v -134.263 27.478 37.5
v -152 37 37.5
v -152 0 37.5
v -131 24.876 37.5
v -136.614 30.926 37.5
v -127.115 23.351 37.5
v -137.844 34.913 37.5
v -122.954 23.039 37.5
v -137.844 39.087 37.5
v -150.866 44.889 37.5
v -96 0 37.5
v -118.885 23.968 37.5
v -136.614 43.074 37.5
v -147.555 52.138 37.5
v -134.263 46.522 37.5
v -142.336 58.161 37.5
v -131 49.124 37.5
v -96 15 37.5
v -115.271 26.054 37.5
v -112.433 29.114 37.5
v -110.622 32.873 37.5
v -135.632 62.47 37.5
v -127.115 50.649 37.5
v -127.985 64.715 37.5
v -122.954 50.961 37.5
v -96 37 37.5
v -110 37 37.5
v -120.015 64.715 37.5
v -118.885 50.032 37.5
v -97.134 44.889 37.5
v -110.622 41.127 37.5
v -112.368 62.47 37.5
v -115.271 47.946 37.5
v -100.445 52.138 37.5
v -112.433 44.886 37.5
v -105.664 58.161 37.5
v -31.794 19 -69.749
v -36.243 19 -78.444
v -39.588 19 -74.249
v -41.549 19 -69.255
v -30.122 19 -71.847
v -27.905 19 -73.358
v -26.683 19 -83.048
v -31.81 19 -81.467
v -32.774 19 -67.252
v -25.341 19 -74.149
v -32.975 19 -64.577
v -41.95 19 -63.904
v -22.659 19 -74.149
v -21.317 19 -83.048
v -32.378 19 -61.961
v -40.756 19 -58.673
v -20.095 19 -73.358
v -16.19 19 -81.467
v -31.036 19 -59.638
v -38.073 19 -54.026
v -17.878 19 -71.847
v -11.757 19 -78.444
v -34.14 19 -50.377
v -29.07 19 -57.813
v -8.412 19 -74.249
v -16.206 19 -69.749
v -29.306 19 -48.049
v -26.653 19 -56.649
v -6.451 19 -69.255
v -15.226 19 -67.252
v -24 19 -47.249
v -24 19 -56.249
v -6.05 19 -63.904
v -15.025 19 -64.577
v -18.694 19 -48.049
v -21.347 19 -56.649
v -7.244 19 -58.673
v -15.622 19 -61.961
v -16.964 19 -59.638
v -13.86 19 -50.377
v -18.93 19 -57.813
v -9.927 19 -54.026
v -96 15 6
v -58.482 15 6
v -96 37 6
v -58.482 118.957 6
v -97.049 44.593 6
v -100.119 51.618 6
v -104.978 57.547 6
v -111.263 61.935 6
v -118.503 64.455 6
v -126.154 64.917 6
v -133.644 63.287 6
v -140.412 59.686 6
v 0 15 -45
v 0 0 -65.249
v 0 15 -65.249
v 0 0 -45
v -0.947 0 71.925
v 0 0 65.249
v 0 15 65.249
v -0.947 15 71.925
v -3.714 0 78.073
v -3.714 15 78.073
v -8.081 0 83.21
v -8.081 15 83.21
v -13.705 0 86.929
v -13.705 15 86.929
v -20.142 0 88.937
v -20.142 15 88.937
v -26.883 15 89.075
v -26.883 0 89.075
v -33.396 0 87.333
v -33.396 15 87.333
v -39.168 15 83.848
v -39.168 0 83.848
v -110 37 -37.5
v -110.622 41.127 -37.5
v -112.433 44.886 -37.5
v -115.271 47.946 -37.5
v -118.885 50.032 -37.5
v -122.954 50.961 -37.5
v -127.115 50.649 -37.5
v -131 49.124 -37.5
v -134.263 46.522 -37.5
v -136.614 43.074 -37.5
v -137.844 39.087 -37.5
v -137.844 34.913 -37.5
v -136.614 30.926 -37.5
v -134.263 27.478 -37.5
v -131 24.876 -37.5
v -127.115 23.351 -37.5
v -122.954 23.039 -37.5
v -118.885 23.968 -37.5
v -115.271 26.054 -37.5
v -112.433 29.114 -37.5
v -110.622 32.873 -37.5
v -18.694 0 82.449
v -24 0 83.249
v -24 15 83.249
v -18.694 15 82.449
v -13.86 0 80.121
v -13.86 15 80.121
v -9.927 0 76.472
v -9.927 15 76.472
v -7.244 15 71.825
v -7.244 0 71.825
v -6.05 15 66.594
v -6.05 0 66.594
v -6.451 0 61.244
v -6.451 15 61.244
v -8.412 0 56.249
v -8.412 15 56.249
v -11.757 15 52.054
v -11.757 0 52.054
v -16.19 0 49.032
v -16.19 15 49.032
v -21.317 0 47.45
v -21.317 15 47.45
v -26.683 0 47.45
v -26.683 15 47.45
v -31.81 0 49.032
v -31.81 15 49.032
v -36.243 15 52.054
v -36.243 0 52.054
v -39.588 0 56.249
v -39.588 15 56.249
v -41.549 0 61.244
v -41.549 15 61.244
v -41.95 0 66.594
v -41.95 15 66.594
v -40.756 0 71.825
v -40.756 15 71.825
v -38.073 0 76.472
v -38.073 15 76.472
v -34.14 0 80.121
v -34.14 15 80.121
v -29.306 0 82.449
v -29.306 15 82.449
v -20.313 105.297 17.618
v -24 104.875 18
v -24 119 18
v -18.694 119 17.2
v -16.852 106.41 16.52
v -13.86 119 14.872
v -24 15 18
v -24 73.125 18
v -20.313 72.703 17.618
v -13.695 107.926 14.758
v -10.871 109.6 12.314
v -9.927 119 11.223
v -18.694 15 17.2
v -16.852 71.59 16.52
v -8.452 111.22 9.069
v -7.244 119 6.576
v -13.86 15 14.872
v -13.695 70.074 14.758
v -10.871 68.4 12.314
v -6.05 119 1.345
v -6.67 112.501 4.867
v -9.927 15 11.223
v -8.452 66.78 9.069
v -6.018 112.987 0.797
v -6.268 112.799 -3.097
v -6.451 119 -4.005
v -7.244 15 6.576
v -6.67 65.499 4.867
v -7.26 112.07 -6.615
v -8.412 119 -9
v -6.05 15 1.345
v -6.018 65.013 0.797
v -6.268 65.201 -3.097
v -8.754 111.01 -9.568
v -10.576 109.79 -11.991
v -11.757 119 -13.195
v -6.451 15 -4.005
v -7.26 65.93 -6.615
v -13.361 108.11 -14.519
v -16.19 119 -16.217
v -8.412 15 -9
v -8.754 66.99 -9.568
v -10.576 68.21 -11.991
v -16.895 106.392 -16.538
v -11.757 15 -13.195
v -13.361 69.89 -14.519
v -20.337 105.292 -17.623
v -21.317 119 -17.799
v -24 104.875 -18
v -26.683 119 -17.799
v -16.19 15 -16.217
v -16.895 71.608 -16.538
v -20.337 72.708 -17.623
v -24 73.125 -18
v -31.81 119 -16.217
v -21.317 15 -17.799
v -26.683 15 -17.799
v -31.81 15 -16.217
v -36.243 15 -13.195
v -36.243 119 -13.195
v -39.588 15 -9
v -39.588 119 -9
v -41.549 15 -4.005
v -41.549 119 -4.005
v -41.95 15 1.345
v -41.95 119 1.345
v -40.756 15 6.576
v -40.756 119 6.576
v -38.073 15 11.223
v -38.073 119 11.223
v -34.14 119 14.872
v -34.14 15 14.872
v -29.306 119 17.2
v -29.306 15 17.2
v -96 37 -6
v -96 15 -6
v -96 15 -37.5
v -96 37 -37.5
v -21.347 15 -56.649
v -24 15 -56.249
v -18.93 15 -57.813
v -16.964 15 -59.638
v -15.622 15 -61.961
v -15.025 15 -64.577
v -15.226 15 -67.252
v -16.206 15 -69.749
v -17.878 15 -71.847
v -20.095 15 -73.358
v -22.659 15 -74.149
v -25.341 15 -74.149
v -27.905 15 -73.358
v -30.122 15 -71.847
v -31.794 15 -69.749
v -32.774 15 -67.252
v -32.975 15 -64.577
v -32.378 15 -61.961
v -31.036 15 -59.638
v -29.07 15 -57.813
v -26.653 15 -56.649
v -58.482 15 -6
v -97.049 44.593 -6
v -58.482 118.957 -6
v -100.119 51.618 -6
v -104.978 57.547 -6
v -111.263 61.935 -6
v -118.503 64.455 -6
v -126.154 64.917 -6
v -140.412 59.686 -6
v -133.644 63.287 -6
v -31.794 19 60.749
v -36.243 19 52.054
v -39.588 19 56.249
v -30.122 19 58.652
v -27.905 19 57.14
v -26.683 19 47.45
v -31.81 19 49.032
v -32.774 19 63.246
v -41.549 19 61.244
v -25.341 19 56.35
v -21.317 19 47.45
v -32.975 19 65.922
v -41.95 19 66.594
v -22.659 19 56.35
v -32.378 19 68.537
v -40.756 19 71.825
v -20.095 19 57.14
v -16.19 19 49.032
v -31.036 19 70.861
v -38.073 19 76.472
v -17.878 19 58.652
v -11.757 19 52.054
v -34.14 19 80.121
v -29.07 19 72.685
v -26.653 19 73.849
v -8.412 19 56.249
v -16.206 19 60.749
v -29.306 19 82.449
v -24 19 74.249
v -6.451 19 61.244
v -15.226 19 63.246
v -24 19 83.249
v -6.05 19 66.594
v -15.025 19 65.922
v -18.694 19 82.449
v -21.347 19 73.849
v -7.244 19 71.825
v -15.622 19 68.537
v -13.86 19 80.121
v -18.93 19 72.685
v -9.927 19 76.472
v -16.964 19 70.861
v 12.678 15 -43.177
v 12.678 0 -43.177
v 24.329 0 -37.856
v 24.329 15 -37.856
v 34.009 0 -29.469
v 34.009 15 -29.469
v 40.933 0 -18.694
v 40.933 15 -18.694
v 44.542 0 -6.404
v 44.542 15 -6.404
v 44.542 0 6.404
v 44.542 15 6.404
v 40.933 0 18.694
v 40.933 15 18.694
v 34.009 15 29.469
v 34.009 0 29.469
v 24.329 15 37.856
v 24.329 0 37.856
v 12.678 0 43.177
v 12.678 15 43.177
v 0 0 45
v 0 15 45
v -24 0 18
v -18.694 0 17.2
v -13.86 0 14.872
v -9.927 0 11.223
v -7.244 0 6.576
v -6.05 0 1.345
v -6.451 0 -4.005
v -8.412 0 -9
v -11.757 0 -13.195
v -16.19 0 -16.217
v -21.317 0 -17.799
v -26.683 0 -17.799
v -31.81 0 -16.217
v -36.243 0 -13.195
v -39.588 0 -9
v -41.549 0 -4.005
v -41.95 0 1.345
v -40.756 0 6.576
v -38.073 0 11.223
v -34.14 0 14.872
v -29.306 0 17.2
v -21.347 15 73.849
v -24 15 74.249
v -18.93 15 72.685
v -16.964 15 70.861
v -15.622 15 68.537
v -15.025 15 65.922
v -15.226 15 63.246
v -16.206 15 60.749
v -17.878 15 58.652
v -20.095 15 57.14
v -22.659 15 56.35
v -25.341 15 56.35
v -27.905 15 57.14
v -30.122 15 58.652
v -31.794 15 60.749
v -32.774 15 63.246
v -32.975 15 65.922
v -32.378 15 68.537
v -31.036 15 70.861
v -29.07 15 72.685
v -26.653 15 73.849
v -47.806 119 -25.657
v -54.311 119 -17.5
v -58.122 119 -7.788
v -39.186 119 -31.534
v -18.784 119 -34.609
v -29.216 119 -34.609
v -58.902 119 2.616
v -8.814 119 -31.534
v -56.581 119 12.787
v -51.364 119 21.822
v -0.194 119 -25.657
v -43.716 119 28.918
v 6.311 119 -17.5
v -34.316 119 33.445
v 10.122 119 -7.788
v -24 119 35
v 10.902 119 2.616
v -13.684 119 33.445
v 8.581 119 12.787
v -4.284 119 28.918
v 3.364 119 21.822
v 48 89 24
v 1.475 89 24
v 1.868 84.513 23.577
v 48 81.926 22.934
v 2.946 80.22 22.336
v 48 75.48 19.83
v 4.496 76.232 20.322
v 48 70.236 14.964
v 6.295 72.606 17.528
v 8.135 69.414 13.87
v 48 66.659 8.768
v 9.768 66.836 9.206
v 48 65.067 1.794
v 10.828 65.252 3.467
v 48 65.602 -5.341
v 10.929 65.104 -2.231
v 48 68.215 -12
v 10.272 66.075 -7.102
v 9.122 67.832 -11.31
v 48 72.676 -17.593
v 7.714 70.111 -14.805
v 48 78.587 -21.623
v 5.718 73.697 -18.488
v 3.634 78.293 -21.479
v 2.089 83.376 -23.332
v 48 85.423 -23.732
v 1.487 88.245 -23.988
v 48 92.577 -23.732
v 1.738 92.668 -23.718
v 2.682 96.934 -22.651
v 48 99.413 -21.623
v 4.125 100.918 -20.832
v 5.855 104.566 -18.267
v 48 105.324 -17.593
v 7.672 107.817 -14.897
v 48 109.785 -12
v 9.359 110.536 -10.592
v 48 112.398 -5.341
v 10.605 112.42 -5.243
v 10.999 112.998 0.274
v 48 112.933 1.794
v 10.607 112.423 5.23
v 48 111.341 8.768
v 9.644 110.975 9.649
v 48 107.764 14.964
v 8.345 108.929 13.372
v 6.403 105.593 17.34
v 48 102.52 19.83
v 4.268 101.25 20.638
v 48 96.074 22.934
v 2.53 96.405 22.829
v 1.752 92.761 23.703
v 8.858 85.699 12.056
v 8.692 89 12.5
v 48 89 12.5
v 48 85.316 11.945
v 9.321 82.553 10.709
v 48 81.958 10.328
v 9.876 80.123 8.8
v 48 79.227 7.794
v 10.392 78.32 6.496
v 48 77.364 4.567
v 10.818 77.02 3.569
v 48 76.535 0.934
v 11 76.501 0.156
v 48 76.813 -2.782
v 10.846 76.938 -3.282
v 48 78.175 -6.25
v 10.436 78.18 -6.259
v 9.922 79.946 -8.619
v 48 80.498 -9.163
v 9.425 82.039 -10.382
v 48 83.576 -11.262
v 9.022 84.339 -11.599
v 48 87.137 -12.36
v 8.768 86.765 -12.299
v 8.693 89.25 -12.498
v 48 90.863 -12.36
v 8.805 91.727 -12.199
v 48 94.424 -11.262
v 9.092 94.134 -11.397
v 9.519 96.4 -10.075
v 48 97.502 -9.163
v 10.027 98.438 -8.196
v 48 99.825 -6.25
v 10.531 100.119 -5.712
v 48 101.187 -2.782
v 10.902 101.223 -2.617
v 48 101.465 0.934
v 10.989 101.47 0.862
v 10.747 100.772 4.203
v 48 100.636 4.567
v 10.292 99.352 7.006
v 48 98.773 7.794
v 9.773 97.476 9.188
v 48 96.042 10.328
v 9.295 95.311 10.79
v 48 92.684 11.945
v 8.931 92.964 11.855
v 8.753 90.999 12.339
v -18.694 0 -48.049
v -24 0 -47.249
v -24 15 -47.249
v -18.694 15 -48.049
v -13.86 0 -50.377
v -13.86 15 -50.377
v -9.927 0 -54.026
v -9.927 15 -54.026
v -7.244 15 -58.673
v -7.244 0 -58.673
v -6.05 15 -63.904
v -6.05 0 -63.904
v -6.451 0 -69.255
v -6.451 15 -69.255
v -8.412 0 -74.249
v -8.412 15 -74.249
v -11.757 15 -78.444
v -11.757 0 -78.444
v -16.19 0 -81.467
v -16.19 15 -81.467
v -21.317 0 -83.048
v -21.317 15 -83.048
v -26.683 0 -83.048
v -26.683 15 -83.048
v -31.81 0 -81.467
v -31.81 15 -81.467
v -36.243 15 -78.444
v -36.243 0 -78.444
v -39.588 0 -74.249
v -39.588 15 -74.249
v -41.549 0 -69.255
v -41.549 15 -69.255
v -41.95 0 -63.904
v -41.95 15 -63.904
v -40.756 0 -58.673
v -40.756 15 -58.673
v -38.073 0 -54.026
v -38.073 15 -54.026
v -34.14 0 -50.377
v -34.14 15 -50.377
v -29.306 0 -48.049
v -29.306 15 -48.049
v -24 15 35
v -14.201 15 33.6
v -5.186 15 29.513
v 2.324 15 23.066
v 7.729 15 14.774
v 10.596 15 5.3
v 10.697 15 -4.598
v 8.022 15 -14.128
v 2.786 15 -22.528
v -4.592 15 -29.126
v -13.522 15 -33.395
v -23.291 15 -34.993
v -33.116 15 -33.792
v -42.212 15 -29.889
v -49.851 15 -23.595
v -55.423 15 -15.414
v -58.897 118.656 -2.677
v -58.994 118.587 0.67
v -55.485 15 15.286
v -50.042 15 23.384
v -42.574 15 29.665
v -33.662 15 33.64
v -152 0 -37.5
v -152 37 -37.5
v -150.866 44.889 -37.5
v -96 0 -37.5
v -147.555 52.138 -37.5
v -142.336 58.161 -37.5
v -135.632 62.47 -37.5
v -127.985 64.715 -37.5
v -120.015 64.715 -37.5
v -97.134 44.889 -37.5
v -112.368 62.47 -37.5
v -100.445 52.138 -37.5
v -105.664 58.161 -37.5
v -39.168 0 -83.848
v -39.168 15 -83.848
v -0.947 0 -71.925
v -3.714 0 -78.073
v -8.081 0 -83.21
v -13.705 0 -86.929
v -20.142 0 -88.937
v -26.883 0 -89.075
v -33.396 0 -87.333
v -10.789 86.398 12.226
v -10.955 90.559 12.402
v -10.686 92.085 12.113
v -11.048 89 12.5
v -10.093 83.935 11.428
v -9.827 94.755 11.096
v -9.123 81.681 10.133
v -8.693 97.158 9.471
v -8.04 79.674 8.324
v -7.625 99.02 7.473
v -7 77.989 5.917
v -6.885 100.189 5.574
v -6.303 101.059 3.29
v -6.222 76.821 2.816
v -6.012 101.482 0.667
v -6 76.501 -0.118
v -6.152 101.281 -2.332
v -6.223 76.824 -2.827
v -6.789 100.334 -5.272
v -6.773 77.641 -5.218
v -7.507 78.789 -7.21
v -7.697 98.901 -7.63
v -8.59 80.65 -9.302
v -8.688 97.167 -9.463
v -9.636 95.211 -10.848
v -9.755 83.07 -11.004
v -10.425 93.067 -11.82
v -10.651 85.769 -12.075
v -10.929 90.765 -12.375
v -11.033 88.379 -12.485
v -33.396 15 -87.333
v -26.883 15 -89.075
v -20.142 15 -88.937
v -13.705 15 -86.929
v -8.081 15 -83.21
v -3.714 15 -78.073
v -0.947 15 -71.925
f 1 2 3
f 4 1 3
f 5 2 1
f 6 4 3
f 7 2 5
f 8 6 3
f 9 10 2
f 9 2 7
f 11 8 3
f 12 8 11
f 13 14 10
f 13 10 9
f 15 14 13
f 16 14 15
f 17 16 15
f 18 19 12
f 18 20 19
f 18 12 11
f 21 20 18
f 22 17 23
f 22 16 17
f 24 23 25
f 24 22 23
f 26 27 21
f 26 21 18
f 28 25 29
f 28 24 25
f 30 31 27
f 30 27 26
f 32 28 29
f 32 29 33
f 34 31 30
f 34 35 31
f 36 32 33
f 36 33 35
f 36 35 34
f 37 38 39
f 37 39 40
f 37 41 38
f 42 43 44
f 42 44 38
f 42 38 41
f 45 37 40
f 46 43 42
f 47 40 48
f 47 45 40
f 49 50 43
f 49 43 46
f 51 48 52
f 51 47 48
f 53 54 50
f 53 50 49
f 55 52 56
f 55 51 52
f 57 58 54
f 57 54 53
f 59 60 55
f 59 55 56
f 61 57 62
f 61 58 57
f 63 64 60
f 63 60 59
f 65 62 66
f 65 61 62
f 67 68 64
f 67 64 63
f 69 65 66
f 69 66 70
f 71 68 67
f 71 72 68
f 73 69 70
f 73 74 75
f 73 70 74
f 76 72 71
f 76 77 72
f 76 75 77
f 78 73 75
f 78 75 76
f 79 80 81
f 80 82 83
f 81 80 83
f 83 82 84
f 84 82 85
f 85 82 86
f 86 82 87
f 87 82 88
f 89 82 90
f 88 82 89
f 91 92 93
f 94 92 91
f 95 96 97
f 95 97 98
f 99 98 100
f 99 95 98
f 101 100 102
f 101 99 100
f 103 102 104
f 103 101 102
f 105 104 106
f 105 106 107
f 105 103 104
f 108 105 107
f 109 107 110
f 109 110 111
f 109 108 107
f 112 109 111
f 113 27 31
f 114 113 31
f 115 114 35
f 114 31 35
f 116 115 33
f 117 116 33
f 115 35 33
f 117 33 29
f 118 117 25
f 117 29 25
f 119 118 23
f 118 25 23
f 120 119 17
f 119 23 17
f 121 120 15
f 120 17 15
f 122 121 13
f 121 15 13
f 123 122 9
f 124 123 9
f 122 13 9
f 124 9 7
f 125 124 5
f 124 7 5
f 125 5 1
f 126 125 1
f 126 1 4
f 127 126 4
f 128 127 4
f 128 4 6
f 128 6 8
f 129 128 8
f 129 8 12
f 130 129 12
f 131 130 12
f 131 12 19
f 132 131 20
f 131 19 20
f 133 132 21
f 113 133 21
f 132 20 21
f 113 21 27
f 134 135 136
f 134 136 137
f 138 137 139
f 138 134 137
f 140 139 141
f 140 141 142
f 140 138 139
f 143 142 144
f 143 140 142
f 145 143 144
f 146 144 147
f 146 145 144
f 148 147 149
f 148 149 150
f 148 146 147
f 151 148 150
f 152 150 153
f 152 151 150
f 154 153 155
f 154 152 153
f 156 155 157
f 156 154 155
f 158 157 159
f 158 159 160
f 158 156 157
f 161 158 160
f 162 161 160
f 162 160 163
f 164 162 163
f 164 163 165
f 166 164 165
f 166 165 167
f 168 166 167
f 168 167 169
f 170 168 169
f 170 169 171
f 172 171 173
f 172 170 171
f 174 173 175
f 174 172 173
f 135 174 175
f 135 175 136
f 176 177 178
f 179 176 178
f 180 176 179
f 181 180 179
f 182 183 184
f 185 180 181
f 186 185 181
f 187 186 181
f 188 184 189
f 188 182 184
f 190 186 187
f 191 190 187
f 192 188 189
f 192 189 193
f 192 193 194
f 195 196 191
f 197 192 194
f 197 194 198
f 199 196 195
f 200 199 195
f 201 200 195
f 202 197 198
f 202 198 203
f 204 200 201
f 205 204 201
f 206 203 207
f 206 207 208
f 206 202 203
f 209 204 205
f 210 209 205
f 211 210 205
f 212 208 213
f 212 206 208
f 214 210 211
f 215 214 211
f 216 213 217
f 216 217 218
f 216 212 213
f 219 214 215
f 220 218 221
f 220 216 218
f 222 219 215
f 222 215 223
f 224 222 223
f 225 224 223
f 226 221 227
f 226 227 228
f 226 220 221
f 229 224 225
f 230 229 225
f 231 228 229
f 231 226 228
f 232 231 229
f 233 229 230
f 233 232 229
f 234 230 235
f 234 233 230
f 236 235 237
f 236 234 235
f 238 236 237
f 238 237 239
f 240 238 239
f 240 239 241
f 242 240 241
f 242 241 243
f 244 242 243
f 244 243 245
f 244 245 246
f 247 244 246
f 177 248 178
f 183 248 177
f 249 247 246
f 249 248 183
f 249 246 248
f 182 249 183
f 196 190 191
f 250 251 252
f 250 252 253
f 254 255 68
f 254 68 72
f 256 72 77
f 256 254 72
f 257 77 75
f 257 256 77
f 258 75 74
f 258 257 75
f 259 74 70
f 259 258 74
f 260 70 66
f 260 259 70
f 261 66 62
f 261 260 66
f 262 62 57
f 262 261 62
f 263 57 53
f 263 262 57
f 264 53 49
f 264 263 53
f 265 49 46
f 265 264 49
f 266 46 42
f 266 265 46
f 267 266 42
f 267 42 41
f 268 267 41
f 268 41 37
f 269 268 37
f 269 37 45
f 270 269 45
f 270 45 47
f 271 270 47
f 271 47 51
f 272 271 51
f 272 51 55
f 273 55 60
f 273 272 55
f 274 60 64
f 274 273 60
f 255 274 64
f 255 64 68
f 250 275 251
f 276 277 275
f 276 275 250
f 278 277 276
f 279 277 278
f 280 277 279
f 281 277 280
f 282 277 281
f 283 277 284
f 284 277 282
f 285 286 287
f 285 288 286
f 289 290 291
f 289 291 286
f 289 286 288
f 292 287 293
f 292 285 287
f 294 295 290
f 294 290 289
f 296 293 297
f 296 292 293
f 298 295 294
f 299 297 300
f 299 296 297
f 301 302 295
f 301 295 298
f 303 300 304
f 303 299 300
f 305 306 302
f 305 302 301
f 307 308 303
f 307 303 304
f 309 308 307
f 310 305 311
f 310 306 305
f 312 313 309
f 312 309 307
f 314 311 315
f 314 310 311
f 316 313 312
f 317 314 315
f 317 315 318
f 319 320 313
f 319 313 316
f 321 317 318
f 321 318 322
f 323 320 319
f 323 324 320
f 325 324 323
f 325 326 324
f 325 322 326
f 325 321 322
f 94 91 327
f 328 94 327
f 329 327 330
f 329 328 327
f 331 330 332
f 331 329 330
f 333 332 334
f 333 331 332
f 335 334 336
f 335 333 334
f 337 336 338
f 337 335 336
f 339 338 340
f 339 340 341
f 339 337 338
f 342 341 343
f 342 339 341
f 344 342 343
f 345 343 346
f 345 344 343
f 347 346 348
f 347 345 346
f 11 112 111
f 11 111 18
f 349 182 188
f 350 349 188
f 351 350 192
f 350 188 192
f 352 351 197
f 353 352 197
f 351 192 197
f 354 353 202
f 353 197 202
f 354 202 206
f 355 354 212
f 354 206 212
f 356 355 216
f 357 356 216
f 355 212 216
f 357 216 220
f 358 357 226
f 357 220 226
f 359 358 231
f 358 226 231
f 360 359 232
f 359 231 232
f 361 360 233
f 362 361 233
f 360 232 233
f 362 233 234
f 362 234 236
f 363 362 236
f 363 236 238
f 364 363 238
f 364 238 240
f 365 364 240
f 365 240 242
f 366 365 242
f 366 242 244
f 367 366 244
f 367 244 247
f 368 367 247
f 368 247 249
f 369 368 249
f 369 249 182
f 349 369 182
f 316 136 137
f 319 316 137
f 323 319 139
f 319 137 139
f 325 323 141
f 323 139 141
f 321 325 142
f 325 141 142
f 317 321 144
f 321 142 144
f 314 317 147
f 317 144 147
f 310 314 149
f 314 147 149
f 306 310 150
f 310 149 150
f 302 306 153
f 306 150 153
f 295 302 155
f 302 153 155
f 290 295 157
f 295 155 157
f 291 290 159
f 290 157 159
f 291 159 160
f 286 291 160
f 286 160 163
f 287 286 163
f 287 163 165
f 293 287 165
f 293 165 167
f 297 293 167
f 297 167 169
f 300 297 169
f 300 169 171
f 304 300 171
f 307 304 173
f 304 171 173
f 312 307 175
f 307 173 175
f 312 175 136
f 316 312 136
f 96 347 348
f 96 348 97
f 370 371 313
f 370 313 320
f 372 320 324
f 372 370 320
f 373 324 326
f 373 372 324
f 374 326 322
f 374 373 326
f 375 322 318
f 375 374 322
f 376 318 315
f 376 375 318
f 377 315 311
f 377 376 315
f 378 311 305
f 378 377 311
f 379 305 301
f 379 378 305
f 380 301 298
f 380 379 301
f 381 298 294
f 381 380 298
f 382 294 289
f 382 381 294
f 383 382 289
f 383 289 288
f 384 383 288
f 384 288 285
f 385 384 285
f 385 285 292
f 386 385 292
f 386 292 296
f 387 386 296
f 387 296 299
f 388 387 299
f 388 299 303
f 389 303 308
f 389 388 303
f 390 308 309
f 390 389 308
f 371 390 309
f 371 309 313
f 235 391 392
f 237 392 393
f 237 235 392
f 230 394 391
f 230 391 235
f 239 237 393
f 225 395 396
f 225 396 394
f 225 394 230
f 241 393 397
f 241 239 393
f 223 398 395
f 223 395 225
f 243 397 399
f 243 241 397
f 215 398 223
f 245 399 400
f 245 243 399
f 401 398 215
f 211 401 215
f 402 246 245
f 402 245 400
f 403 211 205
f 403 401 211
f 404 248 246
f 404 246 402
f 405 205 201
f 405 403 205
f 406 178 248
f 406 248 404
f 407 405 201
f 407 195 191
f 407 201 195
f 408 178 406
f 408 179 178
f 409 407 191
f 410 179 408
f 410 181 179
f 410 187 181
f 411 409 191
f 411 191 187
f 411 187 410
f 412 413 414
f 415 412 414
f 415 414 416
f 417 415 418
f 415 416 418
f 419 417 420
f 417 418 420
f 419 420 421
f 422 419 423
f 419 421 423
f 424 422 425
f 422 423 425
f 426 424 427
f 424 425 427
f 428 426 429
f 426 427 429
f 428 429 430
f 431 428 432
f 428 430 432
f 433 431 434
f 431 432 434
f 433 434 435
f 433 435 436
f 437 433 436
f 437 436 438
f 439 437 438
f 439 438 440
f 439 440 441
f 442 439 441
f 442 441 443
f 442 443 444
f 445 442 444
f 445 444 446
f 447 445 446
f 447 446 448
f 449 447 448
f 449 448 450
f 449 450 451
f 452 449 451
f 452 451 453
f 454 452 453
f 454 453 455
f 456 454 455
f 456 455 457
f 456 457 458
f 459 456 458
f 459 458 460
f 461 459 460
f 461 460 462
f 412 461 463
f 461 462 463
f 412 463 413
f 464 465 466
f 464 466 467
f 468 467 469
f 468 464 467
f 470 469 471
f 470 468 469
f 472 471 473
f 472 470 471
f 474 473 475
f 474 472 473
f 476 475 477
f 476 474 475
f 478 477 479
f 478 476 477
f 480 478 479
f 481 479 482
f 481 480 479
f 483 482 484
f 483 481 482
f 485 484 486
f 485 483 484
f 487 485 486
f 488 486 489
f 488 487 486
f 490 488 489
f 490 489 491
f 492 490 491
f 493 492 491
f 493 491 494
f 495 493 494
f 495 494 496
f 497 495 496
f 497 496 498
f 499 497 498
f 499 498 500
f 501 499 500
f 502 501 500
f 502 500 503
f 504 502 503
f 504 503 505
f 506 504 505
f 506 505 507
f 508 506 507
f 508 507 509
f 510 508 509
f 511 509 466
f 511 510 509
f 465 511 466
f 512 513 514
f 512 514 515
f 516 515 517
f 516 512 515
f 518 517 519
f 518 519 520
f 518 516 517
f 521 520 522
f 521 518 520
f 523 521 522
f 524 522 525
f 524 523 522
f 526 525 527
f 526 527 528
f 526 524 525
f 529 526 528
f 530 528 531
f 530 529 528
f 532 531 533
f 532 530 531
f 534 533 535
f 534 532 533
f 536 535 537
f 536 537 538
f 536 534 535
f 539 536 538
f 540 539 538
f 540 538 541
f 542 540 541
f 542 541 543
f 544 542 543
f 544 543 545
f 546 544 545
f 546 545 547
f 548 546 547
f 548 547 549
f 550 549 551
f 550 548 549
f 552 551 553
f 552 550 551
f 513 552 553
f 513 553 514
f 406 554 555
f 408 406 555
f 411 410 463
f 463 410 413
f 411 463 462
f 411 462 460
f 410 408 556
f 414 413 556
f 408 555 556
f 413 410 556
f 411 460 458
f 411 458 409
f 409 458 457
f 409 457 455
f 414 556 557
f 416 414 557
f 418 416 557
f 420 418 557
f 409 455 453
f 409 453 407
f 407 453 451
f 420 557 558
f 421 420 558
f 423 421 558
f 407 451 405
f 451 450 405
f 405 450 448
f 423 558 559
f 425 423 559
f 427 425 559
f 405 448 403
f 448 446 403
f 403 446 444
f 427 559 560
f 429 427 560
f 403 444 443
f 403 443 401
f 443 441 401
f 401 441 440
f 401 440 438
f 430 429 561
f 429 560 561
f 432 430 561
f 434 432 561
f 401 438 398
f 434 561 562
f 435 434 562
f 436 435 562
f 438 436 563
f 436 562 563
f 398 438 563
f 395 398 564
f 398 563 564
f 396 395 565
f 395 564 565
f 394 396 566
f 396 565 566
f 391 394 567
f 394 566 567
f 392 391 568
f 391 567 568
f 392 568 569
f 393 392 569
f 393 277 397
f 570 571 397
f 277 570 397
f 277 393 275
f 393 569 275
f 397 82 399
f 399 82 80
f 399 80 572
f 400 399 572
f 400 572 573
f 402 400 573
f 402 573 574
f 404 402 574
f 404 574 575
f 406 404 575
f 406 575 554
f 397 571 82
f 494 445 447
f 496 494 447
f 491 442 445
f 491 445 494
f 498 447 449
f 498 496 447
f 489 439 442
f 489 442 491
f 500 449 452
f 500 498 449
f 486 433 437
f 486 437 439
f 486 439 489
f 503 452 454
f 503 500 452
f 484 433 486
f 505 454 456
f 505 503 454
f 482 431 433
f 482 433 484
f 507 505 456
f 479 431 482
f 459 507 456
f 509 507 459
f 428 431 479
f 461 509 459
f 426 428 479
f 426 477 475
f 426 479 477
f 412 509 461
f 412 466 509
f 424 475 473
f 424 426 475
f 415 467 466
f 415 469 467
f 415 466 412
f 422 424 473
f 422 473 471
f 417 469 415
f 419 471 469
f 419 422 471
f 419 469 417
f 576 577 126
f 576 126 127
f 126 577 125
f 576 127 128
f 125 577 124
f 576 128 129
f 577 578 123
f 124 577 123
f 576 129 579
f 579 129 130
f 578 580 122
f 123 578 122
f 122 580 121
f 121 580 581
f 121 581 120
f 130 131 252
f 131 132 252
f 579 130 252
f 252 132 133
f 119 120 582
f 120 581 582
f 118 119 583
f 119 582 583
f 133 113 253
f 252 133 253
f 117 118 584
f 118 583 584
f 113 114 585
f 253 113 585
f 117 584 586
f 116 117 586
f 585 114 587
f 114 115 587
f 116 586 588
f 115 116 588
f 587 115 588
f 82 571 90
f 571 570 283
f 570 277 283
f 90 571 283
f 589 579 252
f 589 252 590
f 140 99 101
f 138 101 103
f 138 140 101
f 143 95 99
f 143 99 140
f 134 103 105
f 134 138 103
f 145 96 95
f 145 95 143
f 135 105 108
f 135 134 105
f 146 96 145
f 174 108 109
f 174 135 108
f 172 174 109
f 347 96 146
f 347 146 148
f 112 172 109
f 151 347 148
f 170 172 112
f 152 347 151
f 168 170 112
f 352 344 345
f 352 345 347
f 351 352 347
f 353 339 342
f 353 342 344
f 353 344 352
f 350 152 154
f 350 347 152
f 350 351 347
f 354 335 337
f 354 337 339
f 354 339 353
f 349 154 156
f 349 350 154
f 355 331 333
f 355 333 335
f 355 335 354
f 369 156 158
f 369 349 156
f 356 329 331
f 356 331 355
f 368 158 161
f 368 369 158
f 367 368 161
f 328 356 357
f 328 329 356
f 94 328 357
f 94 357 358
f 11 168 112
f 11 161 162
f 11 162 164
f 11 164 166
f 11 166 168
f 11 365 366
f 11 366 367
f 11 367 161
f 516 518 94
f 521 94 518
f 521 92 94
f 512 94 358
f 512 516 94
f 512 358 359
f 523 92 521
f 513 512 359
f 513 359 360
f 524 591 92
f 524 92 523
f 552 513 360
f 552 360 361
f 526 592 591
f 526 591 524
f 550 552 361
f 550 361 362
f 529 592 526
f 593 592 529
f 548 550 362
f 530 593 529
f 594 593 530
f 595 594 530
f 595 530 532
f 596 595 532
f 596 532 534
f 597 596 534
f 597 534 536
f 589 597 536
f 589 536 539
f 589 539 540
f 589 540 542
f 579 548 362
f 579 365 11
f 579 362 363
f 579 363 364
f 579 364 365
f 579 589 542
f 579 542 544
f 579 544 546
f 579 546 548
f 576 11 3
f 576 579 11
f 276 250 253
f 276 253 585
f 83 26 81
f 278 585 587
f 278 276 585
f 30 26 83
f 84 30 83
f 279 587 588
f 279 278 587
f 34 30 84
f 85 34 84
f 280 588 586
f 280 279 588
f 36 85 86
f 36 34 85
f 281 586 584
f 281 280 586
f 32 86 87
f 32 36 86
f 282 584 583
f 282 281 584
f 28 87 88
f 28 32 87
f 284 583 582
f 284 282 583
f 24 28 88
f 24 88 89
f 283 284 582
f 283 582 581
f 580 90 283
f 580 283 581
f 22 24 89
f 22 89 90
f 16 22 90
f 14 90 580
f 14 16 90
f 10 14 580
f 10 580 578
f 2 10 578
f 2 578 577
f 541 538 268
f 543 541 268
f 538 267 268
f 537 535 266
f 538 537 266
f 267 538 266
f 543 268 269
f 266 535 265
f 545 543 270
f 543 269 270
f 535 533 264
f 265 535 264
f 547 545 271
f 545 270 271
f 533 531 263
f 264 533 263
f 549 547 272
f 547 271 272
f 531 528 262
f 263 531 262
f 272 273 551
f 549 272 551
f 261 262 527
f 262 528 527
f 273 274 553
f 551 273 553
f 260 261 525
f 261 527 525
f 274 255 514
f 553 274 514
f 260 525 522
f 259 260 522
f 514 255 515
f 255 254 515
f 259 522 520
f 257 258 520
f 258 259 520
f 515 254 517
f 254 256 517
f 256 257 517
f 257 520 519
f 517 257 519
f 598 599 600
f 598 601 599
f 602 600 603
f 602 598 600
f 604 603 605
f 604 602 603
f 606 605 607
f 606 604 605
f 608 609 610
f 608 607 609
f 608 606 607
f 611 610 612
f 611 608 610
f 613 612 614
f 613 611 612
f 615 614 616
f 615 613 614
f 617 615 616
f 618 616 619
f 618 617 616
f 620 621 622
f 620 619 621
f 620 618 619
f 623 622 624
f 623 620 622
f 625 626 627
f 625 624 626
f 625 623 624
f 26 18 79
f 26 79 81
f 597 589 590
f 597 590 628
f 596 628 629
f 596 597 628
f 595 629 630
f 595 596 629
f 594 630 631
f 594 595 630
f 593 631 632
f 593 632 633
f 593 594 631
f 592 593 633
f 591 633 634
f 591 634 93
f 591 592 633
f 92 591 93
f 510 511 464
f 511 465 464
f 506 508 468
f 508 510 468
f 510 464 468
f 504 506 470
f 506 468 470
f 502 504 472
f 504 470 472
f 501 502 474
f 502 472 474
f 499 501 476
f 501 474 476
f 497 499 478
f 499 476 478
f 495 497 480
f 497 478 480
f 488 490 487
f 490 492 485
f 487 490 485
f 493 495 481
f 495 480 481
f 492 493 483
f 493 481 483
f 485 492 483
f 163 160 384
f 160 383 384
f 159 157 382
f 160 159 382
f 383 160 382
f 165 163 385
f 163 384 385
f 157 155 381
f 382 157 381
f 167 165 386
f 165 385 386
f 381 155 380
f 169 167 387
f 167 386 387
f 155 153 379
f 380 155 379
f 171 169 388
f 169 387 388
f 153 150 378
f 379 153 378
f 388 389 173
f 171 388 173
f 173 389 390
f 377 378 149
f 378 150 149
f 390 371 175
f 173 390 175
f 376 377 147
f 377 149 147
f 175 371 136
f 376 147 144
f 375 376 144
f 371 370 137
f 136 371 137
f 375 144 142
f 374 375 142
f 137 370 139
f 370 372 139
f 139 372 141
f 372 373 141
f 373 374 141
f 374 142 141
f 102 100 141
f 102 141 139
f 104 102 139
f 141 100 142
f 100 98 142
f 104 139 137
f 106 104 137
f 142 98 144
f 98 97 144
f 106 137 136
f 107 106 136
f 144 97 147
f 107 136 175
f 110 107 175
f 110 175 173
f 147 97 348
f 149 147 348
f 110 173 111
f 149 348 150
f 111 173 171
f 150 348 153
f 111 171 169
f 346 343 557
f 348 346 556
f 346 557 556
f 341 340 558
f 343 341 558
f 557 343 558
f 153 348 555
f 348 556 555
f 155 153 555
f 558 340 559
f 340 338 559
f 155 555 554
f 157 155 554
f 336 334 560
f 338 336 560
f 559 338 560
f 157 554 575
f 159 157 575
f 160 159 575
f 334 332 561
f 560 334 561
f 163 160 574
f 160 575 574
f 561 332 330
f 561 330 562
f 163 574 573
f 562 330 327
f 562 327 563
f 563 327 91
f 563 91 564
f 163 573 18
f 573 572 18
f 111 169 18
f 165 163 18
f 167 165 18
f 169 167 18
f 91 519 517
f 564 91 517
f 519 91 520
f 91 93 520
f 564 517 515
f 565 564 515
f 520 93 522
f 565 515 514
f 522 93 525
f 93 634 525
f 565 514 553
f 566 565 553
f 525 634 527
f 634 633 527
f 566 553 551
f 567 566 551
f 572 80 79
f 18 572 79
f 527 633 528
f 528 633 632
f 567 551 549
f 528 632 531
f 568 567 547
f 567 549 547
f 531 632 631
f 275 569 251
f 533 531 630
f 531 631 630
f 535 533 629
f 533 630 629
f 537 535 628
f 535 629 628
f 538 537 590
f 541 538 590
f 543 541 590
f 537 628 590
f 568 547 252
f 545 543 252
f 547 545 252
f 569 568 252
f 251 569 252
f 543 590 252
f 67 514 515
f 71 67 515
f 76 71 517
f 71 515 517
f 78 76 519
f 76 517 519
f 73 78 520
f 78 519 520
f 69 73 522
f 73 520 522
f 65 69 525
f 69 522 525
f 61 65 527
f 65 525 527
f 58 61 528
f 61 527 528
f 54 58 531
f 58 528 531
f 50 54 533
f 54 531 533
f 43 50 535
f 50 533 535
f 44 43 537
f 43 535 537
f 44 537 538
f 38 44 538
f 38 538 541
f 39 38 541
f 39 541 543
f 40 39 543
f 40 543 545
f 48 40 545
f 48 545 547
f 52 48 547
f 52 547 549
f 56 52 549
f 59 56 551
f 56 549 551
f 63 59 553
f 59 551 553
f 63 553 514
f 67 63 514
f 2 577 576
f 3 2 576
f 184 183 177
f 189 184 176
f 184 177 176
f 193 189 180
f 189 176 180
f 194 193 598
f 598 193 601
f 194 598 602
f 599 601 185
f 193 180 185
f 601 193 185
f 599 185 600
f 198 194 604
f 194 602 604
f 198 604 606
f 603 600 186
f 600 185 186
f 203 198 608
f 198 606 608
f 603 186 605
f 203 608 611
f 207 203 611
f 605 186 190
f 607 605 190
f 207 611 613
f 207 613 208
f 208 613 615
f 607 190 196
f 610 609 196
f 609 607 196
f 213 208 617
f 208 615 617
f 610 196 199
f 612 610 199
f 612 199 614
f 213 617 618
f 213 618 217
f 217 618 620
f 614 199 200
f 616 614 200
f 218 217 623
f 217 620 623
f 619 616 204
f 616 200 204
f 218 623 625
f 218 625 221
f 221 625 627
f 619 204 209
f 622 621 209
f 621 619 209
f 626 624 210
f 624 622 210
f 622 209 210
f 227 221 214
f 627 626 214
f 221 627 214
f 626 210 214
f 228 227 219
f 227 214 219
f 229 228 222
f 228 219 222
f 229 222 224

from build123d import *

# Parameters (mm, degrees)
SKETCH1_R             = 18
BOSS_EXTRUDE1_DEPTH   = 15
SKETCH2_R             = 18
SKETCH2_R_2           = 9
BOSS_EXTRUDE2_DEPTH   = 4
BOSS_EXTRUDE2_2_DEPTH = 4
SKETCH3_R             = 35
SKETCH3_R_2           = 18
BOSS_EXTRUDE3_DEPTH   = 104
SKETCH4_R             = 14
BOSS_EXTRUDE4_DEPTH   = 75
SKETCH6_R             = 24
SKETCH6_R_2           = 12.5
BOSS_EXTRUDE5_DEPTH   = 72
SKETCH9_R             = 18
CUT_EXTRUDE2_DEPTH    = 213.674418186
RIB1_REACH            = 214.674
SKETCH17_WALL_W       = 526.407388692
SKETCH17_WALL_H       = 12


with BuildPart() as part:
    # Sketch1 → Boss-Extrude1 (new body)
    with BuildSketch(Plane(origin=(0, 0, 0), x_dir=(1, 0, 0), z_dir=(0, 1, 0))):
        with BuildLine():
            Line((0, -45), (0, -65.249135293))
            ThreePointArc((0, -65.249135293), (-13.705250772, -86.929037007), (-39.168178194, -83.848231247))
            Line((-39.168178194, -83.848231247), (-96, -37.5))
            Line((-96, -37.5), (-152, -37.5))
            Line((-152, -37.5), (-152, 37.5))
            Line((-152, 37.5), (-96, 37.5))
            Line((-96, 37.5), (-39.168178194, 83.848231247))
            ThreePointArc((-39.168178194, 83.848231247), (-13.705250772, 86.929037007), (0, 65.249135293))
            Line((0, 65.249135293), (0, 45))
            ThreePointArc((0, 45), (45, 0), (0, -45))
        make_face()
        with Locations(Location((-24, 65.249135293, 0), (0, 0, 270))):
            Circle(SKETCH1_R, mode=Mode.SUBTRACT)
        with Locations(Location((-24, -65.249135293, 0), (0, 0, 270))):
            Circle(SKETCH1_R, mode=Mode.SUBTRACT)
    extrude(amount=BOSS_EXTRUDE1_DEPTH)

    # Sketch3 → Boss-Extrude3 (add)
    with BuildSketch(Plane(origin=(0, 15, 0), x_dir=(1, 0, 0), z_dir=(0, 1, 0))):
        with Locations(Location((-24, 0, 0), (0, 0, 270))):
            Circle(SKETCH3_R)
        with Locations(Location((-24, 0, 0), (0, 0, 270))):
            Circle(SKETCH3_R_2, mode=Mode.SUBTRACT)
    extrude(amount=BOSS_EXTRUDE3_DEPTH)

    # Sketch4 → Boss-Extrude4 (add)
    with BuildSketch(Plane.XY.offset(37.5)):
        with BuildLine():
            Line((-96, 15), (-96, 37))
            ThreePointArc((-96, 37), (-124, 65), (-152, 37))
            Line((-152, 37), (-152, 15))
            Line((-152, 15), (-96, 15))
        make_face()
        with Locations((-124, 37)):
            Circle(SKETCH4_R, mode=Mode.SUBTRACT)
    extrude(amount=-BOSS_EXTRUDE4_DEPTH)

    # Sketch6 → Boss-Extrude5 (add)
    with BuildSketch(Plane(origin=(-24, 0, 0), x_dir=(0, 0, -1), z_dir=(1, 0, 0))):
        with Locations(Location((0, 89, 0), (0, 0, 180))):
            Circle(SKETCH6_R)
        with Locations(Location((0, 89, 0), (0, 0, 180))):
            Circle(SKETCH6_R_2, mode=Mode.SUBTRACT)
    extrude(amount=BOSS_EXTRUDE5_DEPTH)

    # Sketch9 → Cut-Extrude2 (cut, through all)
    with BuildSketch(Plane(origin=(0, 119, 0), x_dir=(1, 0, 0), z_dir=(0, 1, 0))):
        with Locations(Location((-24, 0, 0), (0, 0, 270))):
            Circle(SKETCH9_R)
    extrude(amount=-CUT_EXTRUDE2_DEPTH, mode=Mode.SUBTRACT)

    # Sketch17 wall → Rib1 (add, up to next)
    with BuildSketch(Plane(origin=(-99.129265772, 89.551140917, 0), x_dir=(-0.810213048284, -0.586135493202, 0), z_dir=(0.586135493202, -0.810213048284, 0)), mode=Mode.PRIVATE) as rib1_sk1:
        Rectangle(SKETCH17_WALL_W, SKETCH17_WALL_H)
    rib1_tool1 = extrude(rib1_sk1.sketch, amount=RIB1_REACH, mode=Mode.PRIVATE) - part.part
    add(rib1_tool1.solids().sort_by_distance((-99.129265772, 89.551140917, 0))[0])


with BuildPart() as body_2:
    # Sketch2 → Boss-Extrude2 (new body)
    with BuildSketch(Plane(origin=(0, 15, 0), x_dir=(1, 0, 0), z_dir=(0, 1, 0))):
        with Locations(Location((-24, 65.249135293, 0), (0, 0, 270))):
            Circle(SKETCH2_R)
        with Locations(Location((-24, 65.249135293, 0), (0, 0, 270))):
            Circle(SKETCH2_R_2, mode=Mode.SUBTRACT)
    extrude(amount=BOSS_EXTRUDE2_DEPTH)


with BuildPart() as body_3:
    # Sketch2 → Boss-Extrude2 2 (new body)
    with BuildSketch(Plane(origin=(0, 15, 0), x_dir=(1, 0, 0), z_dir=(0, 1, 0))):
        with Locations(Location((-24, -65.249135293, 0), (0, 0, 270))):
            Circle(SKETCH2_R)
        with Locations(Location((-24, -65.249135293, 0), (0, 0, 270))):
            Circle(SKETCH2_R_2, mode=Mode.SUBTRACT)
    extrude(amount=BOSS_EXTRUDE2_2_DEPTH)


solid = Compound([part.part, body_2.part, body_3.part])
